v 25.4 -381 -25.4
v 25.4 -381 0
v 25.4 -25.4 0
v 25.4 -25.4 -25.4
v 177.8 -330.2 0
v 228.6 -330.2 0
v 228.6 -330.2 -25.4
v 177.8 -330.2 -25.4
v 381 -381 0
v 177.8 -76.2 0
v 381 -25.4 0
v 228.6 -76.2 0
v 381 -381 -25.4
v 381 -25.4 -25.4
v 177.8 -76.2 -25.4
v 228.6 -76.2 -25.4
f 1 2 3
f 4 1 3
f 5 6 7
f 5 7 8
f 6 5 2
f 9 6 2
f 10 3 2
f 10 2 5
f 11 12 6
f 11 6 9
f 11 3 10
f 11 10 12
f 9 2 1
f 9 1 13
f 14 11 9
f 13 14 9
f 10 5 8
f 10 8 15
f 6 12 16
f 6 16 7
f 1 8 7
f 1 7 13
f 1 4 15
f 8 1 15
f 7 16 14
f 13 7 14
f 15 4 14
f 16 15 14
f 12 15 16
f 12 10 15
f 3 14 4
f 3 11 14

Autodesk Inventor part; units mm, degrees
ref_plane "YZ Plane" through (0, 0, 0) normal (1, 0, 0) x (0, 1, 0)
ref_plane "XZ Plane" through (0, 0, 0) normal (0, 1, 0) x (-1, 0, 0)
ref_plane "XY Plane" through (0, 0, 0) normal (0, 0, 1) x (1, 0, 0)
sketch "Sketch1" plane through (0, 0, 0) normal (0, 0, 1) x (1, 0, 0)
  line L0 (0, 0) -> (812.8, 0) construction
  line L1 (812.8, 0) -> (812.8, -406.4) construction
  line L2 (812.8, -406.4) -> (0, -406.4) construction
  line L3 (0, -406.4) -> (0, 0) construction
  line L4 (0, 0) -> (406.4, 0)
  line L5 (406.4, 0) -> (406.4, -25.4)
  line L6 (406.4, -25.4) -> (0, -25.4)
  line L7 (0, -25.4) -> (0, 0)
  line L8 (406.4, -25.4) -> (381, -25.4)
  line L9 (381, -25.4) -> (381, -406.4)
  line L10 (381, -406.4) -> (406.4, -406.4)
  line L11 (406.4, -406.4) -> (406.4, -25.4)
  line L12 (381, -406.4) -> (0, -406.4)
  line L13 (0, -406.4) -> (0, -381)
  line L14 (0, -381) -> (381, -381)
  line L15 (381, -381) -> (381, -406.4)
  line L16 (0, -381) -> (25.4, -381)
  line L17 (25.4, -381) -> (25.4, -25.4)
  line L18 (25.4, -25.4) -> (0, -25.4)
  line L19 (0, -25.4) -> (0, -381)
  dimension "d1" = 812.8
  dimension "d5" = 406.4
  dimension "d6" = 25.4
  dimension "d7" = 25.4
  dimension "d8" = 381
  dimension "d9" = 381
  dimension "d10" = 25.4
  dimension "d11" = 25.4
extrude "Extrusion1" add sketch "Sketch1" against normal blind 25.4 contours L6 L9 L14 L17
sketch "Sketch3" plane through (0, 0, 0) normal (0, 0, 1) x (1, 0, 0)
  line L0 (-406.4, 0) -> (406.4, 0) construction
  line L1 (406.4, 0) -> (406.4, -406.4) construction
  line L2 (406.4, -406.4) -> (-406.4, -406.4) construction
  line L3 (-406.4, -406.4) -> (-406.4, 0) construction
  line L4 (406.4, 0) -> (406.4, -406.4)
  line L5 (381, -381) -> (25.4, -381) projected
  line L6 (203.2, -381) -> (203.2, -355.6)
  line L7 (203.2, -355.6) -> (254, -355.6)
  line L8 (254, -355.6) -> (254, -50.8)
  line L9 (254, -50.8) -> (152.4, -50.8)
  line L10 (152.4, -50.8) -> (152.4, -355.6)
  line L11 (152.4, -355.6) -> (203.2, -355.6)
  point P0 (0, 0)
  dimension "d36" = 812.8
  dimension "d45" = 25.4
  dimension "d46" = 50.8
  dimension "d47" = 304.8
  dimension "d48" = 101.6
extrude "Extrusion3" cut sketch "Sketch3" against normal blind 25.4
sketch "Sketch4" plane through (0, 0, 0) normal (0, 0, 1) x (1, 0, 0)
  line L0 (152.4, -50.8) -> (152.4, -355.6) projected
  line L1 (152.4, -50.8) -> (177.8, -50.8)
  line L2 (177.8, -50.8) -> (177.8, -76.2)
  line L3 (177.8, -76.2) -> (152.4, -76.2)
  line L4 (152.4, -76.2) -> (152.4, -50.8)
  line L5 (254, -355.6) -> (254, -50.8) projected
  line L6 (254, -355.6) -> (228.6, -355.6)
  line L7 (228.6, -355.6) -> (228.6, -330.2)
  line L8 (228.6, -330.2) -> (254, -330.2)
  line L9 (254, -330.2) -> (254, -355.6)
  line L10 (228.6, -330.2) -> (177.8, -330.2)
  line L11 (177.8, -330.2) -> (177.8, -76.2)
  line L12 (177.8, -76.2) -> (228.6, -76.2)
  line L13 (228.6, -76.2) -> (228.6, -330.2)
  line L14 (152.4, -50.8) -> (254, -50.8)
  line L15 (254, -50.8) -> (254, -355.6)
  line L16 (254, -355.6) -> (152.4, -355.6)
  line L17 (152.4, -355.6) -> (152.4, -50.8)
  point P0 (0, 0)
  dimension "d51" = 25.4
  dimension "d52" = 25.4
  dimension "d53" = 25.4
  dimension "d54" = 25.4
extrude "Extrusion4" add sketch "Sketch4" against normal blind 25.4 contours L1 L2 L3 L0 | L3 L11 L10 L7 L16 L0 | L14 L5 L8 L13 L12 L2 | L7 L8 L5 L6
properties part number "JukeBox Top Panel SQ" material "Oak, Red"
